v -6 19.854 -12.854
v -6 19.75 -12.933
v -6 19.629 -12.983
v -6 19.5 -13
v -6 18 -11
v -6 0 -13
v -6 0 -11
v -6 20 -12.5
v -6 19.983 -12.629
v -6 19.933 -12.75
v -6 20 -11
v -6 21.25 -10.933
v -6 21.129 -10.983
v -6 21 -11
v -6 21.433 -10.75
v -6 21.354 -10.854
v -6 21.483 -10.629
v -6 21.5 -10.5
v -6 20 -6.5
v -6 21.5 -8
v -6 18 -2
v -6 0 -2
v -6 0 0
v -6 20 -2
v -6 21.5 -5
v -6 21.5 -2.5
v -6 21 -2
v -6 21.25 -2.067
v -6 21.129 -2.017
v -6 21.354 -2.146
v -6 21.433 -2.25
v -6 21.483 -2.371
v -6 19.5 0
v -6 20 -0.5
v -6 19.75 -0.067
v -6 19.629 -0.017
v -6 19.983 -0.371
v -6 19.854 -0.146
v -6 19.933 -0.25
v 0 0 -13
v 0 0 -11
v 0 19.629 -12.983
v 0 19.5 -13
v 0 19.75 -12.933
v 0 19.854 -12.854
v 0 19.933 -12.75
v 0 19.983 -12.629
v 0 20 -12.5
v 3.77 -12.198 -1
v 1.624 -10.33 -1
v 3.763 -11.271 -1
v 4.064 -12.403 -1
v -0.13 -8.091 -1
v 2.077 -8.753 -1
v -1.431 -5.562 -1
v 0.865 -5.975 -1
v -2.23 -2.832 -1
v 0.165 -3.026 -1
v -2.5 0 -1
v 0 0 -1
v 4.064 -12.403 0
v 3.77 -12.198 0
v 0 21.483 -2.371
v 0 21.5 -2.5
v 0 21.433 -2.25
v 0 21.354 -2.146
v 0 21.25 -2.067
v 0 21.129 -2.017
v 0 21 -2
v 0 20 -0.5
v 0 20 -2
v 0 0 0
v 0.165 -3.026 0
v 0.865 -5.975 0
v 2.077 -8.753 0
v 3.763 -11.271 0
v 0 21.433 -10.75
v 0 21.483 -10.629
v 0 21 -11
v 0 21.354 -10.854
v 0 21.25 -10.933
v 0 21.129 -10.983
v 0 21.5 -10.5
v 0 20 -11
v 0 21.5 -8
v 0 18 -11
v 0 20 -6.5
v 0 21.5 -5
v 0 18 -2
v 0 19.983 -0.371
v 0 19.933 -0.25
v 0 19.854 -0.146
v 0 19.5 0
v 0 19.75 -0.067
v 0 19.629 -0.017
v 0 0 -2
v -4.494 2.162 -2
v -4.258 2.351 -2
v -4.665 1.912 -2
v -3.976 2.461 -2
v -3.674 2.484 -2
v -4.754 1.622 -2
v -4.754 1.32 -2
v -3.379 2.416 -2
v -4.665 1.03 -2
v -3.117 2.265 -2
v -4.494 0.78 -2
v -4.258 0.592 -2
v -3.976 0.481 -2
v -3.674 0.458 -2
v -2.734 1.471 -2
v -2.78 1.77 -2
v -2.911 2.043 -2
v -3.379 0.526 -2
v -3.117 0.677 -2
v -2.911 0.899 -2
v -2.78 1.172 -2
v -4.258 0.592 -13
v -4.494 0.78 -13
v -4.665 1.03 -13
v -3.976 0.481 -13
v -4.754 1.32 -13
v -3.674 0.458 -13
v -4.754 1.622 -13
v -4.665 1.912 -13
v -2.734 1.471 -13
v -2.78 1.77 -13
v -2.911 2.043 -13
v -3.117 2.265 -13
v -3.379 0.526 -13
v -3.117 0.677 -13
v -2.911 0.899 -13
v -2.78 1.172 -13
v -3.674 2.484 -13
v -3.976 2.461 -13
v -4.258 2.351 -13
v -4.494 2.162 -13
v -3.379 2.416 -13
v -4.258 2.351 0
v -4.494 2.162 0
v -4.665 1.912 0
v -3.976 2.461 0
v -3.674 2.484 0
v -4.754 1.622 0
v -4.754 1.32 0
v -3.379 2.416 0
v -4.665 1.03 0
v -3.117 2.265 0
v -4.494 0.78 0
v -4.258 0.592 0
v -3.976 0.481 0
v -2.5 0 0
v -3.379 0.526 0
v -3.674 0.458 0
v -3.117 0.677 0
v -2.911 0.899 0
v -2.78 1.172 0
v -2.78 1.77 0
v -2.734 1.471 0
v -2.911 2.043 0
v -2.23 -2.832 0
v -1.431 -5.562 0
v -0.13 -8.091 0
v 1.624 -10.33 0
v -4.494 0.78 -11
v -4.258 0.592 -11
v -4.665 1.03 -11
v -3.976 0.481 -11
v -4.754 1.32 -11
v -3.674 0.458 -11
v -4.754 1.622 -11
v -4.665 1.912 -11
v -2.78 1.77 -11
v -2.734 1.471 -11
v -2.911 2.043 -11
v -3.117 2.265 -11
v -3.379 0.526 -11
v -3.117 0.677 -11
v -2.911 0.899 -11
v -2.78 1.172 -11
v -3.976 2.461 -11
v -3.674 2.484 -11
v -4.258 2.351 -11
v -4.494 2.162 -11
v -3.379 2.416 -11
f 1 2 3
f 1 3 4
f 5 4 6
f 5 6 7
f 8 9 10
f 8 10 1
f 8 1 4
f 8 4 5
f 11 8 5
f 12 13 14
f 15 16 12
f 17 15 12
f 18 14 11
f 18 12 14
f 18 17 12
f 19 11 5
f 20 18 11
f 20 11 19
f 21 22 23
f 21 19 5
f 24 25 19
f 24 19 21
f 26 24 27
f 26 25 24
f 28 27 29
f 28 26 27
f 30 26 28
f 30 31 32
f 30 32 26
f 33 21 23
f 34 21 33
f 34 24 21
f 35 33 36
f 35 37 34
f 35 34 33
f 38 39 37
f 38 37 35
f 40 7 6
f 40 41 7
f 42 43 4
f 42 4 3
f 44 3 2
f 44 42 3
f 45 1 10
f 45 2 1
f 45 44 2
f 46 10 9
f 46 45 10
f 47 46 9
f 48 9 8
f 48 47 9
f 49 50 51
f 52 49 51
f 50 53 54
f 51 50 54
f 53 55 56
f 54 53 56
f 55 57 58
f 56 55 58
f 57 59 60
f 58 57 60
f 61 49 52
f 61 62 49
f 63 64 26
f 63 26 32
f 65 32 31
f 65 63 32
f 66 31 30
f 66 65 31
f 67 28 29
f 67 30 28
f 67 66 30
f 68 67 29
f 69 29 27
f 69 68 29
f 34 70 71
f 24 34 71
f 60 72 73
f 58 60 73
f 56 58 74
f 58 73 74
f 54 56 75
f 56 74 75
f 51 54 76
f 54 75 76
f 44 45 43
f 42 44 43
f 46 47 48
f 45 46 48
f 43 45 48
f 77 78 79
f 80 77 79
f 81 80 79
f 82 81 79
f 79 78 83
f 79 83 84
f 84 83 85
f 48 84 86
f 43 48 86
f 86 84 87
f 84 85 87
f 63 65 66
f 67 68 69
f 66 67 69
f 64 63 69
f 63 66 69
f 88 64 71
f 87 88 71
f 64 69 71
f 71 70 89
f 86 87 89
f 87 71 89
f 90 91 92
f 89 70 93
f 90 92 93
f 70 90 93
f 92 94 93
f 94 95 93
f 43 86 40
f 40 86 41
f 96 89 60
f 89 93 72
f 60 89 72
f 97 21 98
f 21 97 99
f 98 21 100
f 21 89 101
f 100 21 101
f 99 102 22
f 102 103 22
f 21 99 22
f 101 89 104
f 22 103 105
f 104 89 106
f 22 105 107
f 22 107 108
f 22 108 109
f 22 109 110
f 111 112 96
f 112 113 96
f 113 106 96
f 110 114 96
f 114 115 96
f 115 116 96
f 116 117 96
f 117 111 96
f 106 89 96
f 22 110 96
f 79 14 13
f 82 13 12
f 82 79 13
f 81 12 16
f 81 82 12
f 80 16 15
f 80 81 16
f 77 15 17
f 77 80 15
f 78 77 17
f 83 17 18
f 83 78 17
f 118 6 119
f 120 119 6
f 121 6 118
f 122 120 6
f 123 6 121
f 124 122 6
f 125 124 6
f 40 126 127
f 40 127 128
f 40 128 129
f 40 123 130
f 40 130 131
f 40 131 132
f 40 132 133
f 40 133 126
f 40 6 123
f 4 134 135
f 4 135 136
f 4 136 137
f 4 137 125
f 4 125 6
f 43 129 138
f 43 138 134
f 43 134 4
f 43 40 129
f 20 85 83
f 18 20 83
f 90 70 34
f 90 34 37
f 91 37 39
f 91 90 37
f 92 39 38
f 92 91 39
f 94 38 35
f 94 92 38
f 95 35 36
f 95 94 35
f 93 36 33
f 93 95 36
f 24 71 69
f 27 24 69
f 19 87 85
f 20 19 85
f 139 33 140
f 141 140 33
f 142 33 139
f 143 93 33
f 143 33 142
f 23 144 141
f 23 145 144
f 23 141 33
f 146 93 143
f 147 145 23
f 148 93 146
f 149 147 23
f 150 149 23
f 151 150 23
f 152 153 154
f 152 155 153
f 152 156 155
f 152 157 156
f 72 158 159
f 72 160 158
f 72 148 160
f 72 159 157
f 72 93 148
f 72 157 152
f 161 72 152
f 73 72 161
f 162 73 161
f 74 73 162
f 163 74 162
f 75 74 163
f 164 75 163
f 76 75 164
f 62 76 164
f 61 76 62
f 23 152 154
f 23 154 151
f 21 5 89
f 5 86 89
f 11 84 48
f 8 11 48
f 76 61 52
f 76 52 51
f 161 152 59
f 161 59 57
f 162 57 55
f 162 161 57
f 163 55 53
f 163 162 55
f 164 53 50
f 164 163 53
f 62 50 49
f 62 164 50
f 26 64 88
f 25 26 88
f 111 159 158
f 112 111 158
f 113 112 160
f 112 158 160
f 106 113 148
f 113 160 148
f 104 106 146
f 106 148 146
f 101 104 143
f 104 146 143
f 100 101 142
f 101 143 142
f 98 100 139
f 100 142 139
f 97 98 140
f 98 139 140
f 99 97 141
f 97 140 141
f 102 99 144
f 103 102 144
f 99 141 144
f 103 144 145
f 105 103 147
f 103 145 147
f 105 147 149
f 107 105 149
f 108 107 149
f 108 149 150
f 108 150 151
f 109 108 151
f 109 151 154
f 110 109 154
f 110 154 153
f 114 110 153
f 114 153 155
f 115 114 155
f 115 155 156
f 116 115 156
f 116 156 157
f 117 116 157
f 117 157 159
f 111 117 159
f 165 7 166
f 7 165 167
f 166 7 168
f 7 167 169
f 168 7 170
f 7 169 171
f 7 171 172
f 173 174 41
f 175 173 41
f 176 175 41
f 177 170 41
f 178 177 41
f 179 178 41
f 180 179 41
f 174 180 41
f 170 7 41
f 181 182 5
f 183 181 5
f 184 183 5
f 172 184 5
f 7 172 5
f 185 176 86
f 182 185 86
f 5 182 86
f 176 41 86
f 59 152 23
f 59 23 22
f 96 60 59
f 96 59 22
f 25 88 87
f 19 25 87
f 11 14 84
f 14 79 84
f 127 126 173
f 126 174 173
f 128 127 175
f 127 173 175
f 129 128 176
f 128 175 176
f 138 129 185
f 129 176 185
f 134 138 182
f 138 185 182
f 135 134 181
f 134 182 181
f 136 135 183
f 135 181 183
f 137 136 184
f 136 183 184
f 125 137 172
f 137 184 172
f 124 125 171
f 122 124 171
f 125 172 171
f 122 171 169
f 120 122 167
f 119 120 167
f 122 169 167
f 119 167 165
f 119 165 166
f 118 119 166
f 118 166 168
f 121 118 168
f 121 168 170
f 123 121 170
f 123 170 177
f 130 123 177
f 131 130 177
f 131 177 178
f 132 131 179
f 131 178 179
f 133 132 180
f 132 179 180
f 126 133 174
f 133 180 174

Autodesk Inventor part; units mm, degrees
ref_plane "YZ Plane" through (0, 0, 0) normal (1, 0, 0) x (0, 1, 0)
ref_plane "XZ Plane" through (0, 0, 0) normal (0, 1, 0) x (-1, 0, 0)
ref_plane "XY Plane" through (0, 0, 0) normal (0, 0, 1) x (1, 0, 0)
sketch "Sketch1" plane through (0, 0, 0) normal (0, 0, 1) x (1, 0, 0)
  line L0 (0, 0) -> (-5, 0)
  line L1 (-5, 0) -> (-5, 20)
  line L2 (-5, 20) -> (0, 20)
  line L3 (0, 20) -> (0, 0)
  arc A0 (0, 0) -> (3.7628, -11.2711) centre (16.9897, -0.5917) ccw
  arc A1 (-2.5, 0) -> (3.7698, -12.1977) centre (12.5, 0) ccw
  line L4 (4.0643, -12.4032) -> (3.7628, -11.2711)
  line L5 (-5, 0) -> (-2.5, 0)
  line L6 (0, 20) -> (0, 0)
  line L7 (3.7698, -12.1977) -> (4.0643, -12.4032)
  circle A2 centre (-3.75, 1.4711) radius 1.0155
  dimension "d0" = 5
  dimension "d1" = 20
  dimension "d2" = 17
  dimension "d3" = 15
extrude "Extrusion1" add sketch "Sketch1" against normal blind 13 contours L0 L1 L2 L3 | A2
extrude "Extrusion2" add sketch "Sketch1" against normal blind 1 contours A0 L4 L7 A1 L0
sketch "Sketch2" plane through (0, 0, -13) normal (1, 0, 0) x (0, 0, -1)
  line L0 (-12, 0) -> (0, 0) projected
  line L1 (-11, 14.4434) -> (-11, 18)
  line L2 (-2, 18) -> (-2, 0)
  line L3 (-2, 0) -> (-11, 0)
  line L4 (-13, 20) -> (0, 20) projected
  line L5 (-13, -11.2711) -> (-12, -11.2711) projected
  line L6 (-4.8653, 18) -> (-2, 18)
  line L7 (-13, 0) -> (-13, 20) projected
  line L8 (0, 20) -> (0, 0) projected
  line L9 (-11, 18) -> (-4.8653, 18)
  line L10 (-11, 14.4434) -> (-11, 0)
  line L11 (-13, 0) -> (0, 0) projected
  line L12 (-11, 20) -> (-11, 21.5)
  line L13 (-2, 21.5) -> (-2, 20)
  line L14 (-11, 20) -> (-2, 20)
  line L15 (-13, 20) -> (0, 20) projected
  line L16 (-6.5, 21.5) -> (-6.5, 20) construction
  line L17 (-5, 21.5) -> (-6.5, 20)
  line L18 (-6.5, 20) -> (-8, 21.5)
  line L19 (-2, 21.5) -> (-5, 21.5)
  line L20 (-8, 21.5) -> (-11, 21.5)
  point P0 (-1, 20)
  point P1 (-12, 20)
  point P2 (-12, 20.7344)
  point P3 (-2, 0)
  dimension "d10" = 18
  dimension "d19" = 2
  dimension "d20" = 2
  dimension "d24" = 2
  dimension "d25" = 4.5
  dimension "d26" = 2
  dimension "d27" = 1.5
  dimension "d28" = 1.5
extrude "Extrusion3" add sketch "Sketch2" against normal blind 5 contours L17 L19 L13 L4
extrude "Extrusion4" add sketch "Sketch2" against normal blind 5 contours L12 L20 L18 L4 | L17 L19 L13 L4
extrude "Extrusion5" cut sketch "Sketch2" against normal through all contours L10 L1 L9 L6 L2 L0
extrude "Extrusion6" cut sketch "Sketch1" against normal through all contours A2
fillet "Arredondamento1" radius 0.5 2 edges at (-2.5, 21.5, -11) (-2.5, 21.5, -2)
fillet "Arredondamento2" radius 0.5 2 edges at (-2.5, 20, -13) (-2.5, 20, 0)
sketch "Esboço3" plane through (-5, 0, -11) normal (-1, 0, 0) x (0, 0, 1)
  arc A0 (11, 19.5) -> (10.5, 20) centre (10.5, 19.5) ccw projected
  line L0 (10.5, 20) -> (9, 20) projected
  line L1 (9, 20) -> (9, 21) projected
  arc A1 (9, 21) -> (8.5, 21.5) centre (8.5, 21) ccw projected
  line L2 (8.5, 21.5) -> (6, 21.5) projected
  line L3 (6, 21.5) -> (4.5, 20) projected
  line L4 (4.5, 20) -> (3, 21.5) projected
  line L5 (3, 21.5) -> (0.5, 21.5) projected
  arc A2 (0.5, 21.5) -> (0, 21) centre (0.5, 21) ccw projected
  line L6 (0, 21) -> (0, 20) projected
  line L7 (0, 20) -> (-1.5, 20) projected
  arc A3 (-1.5, 20) -> (-2, 19.5) centre (-1.5, 19.5) ccw projected
  line L8 (-2, 0) -> (-2, 19.5) projected
  line L9 (0, 0) -> (-2, 0) projected
  line L10 (0, 0) -> (0, 18) projected
  line L11 (0, 18) -> (9, 18) projected
  line L12 (9, 18) -> (9, 0) projected
  line L13 (11, 0) -> (9, 0) projected
  line L14 (11, 19.5) -> (11, 0) projected
  point P0 (11, 0)
extrude "Extrusão7" add sketch "Esboço3" along normal blind 1
properties material "Nickel-Copper Alloy 400"
